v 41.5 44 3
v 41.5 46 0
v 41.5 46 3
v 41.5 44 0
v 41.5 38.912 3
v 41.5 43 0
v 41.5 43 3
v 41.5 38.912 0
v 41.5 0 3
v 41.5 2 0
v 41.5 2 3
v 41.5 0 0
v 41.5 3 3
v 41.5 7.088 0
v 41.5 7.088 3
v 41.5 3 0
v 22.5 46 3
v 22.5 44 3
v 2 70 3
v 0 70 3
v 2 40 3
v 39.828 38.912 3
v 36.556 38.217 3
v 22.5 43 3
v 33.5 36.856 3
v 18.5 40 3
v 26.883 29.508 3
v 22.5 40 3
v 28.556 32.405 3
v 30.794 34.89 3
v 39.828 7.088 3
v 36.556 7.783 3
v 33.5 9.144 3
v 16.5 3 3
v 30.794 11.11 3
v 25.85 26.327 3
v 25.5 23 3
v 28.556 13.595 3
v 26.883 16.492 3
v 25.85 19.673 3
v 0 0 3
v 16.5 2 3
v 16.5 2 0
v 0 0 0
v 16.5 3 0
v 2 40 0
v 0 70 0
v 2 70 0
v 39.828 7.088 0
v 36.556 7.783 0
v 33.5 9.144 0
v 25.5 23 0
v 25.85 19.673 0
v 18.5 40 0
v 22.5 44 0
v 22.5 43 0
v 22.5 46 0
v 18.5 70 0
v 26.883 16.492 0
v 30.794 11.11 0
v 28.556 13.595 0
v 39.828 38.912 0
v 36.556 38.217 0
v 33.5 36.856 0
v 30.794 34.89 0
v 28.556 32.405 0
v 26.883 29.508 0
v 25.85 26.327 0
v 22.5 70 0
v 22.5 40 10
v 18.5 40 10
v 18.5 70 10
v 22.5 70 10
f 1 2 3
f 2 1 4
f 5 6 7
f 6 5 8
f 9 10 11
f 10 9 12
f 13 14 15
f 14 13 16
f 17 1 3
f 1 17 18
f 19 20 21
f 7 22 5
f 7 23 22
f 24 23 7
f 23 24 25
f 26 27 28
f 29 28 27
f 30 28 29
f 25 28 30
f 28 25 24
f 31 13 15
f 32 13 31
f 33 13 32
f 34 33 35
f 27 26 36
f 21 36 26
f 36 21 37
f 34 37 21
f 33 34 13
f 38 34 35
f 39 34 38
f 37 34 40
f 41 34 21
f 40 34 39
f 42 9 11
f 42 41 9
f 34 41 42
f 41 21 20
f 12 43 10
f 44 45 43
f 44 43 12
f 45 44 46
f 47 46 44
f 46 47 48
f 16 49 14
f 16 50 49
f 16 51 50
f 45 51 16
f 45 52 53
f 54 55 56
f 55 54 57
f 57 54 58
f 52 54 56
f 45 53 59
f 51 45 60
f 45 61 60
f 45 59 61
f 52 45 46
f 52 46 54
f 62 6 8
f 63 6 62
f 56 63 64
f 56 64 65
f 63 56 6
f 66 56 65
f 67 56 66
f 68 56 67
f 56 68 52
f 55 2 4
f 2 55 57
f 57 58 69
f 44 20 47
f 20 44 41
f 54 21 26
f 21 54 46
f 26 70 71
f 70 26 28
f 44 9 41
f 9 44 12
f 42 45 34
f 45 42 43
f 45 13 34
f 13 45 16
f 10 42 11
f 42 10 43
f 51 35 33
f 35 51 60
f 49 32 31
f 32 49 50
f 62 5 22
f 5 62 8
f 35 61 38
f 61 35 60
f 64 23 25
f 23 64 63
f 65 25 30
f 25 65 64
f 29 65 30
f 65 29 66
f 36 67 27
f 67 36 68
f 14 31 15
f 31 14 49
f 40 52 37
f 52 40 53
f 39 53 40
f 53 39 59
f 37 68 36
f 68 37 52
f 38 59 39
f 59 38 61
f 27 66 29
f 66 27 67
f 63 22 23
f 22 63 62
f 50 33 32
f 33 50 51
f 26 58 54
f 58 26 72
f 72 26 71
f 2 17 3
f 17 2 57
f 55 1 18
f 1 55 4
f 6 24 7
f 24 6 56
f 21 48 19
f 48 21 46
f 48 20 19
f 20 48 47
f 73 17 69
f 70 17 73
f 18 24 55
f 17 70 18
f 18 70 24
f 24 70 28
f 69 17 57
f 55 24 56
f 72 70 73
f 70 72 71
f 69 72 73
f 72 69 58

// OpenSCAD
//table thickness in mm
t=16.5;

translate([0,0,0])cube([2,70,3]);
difference() {
	cube([t+25,40,3]);
	translate([t,2,-1])cube([31,1,5]);
	translate([t+25,23,-1])cylinder(r=16,h=5);
}
translate([t+2,40,0]) cube([4,30,10]);
difference() {
	translate([t+2,40,0]) cube([23,6,3]);
	translate([t+5,43,-1])cube([30,1,5]);

}
